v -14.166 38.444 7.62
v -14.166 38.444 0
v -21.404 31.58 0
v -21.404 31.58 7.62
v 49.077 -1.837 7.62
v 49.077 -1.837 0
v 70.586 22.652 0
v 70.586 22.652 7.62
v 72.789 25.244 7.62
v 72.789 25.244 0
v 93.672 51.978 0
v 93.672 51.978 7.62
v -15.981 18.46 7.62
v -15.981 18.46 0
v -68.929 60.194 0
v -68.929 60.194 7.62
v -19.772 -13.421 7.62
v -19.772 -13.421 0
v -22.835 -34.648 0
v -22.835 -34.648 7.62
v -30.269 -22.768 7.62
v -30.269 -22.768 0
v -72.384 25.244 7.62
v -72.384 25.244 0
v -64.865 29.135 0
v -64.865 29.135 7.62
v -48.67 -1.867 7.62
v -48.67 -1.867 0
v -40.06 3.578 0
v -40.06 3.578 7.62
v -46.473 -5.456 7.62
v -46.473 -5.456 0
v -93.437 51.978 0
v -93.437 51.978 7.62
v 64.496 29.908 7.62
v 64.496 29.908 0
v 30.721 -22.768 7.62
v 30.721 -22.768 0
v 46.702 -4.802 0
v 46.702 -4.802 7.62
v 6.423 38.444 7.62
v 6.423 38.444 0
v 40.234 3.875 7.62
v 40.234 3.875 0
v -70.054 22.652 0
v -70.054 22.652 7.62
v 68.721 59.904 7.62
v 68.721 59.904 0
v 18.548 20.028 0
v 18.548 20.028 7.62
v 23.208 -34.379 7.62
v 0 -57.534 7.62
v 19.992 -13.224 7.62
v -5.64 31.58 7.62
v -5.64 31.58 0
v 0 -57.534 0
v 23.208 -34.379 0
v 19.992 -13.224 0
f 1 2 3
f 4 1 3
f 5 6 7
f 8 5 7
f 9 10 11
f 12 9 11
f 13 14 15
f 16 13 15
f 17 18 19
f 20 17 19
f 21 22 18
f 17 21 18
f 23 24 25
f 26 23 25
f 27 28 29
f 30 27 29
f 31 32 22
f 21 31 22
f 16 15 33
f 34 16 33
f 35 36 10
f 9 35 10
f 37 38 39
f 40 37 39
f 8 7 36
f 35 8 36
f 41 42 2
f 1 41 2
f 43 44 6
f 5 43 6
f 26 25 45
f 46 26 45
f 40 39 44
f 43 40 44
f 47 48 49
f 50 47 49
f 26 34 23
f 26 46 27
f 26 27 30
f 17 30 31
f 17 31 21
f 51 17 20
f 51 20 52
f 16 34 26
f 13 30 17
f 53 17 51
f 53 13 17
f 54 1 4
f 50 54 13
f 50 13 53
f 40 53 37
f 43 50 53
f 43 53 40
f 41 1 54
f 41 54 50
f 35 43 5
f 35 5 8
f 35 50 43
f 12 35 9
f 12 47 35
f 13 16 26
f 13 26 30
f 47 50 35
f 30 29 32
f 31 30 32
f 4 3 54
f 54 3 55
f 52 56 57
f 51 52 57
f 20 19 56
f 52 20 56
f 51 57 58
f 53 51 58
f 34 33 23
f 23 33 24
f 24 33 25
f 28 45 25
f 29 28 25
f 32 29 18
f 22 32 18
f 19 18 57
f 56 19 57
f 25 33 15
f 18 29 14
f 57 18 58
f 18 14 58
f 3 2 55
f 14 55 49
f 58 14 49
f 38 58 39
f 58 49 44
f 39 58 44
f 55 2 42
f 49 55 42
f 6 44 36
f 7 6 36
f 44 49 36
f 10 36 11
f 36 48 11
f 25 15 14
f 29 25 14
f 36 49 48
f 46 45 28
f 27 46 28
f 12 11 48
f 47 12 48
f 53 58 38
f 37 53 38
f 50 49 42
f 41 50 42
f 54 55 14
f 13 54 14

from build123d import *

# Parameters (mm, degrees)
F1_DEPTH = 7.62


with BuildPart() as f1:
    # F0 (on Top) → F1 (new body)
    with BuildSketch(Plane.XY):
        Polygon((6.422935, 38.444217), (-14.166216, 38.444217), (-21.403519, 31.57974), (-5.64046, 31.57974), (-15.981315, 18.460336), (-68.928845, 60.194146), (-93.437128, 51.977817), (-72.384275, 25.243798), (-64.864993, 29.134912), (-70.054352, 22.652369), (-48.670258, -1.8672), (-40.059935, 3.577625), (-46.473149, -5.455938), (-30.269377, -22.767998), (-19.772258, -13.421346), (-22.834825, -34.648044), (0, -57.534426), (23.207549, -34.379158), (19.991519, -13.223941), (30.720653, -22.767998), (46.702418, -4.801791), (40.234059, 3.875277), (49.077254, -1.836646), (70.586123, 22.652369), (64.496264, 29.908372), (72.788842, 25.243798), (93.672454, 51.977817), (68.720646, 59.903685), (18.547656, 20.028364), align=None)
    extrude(amount=F1_DEPTH)


solid = f1.part
